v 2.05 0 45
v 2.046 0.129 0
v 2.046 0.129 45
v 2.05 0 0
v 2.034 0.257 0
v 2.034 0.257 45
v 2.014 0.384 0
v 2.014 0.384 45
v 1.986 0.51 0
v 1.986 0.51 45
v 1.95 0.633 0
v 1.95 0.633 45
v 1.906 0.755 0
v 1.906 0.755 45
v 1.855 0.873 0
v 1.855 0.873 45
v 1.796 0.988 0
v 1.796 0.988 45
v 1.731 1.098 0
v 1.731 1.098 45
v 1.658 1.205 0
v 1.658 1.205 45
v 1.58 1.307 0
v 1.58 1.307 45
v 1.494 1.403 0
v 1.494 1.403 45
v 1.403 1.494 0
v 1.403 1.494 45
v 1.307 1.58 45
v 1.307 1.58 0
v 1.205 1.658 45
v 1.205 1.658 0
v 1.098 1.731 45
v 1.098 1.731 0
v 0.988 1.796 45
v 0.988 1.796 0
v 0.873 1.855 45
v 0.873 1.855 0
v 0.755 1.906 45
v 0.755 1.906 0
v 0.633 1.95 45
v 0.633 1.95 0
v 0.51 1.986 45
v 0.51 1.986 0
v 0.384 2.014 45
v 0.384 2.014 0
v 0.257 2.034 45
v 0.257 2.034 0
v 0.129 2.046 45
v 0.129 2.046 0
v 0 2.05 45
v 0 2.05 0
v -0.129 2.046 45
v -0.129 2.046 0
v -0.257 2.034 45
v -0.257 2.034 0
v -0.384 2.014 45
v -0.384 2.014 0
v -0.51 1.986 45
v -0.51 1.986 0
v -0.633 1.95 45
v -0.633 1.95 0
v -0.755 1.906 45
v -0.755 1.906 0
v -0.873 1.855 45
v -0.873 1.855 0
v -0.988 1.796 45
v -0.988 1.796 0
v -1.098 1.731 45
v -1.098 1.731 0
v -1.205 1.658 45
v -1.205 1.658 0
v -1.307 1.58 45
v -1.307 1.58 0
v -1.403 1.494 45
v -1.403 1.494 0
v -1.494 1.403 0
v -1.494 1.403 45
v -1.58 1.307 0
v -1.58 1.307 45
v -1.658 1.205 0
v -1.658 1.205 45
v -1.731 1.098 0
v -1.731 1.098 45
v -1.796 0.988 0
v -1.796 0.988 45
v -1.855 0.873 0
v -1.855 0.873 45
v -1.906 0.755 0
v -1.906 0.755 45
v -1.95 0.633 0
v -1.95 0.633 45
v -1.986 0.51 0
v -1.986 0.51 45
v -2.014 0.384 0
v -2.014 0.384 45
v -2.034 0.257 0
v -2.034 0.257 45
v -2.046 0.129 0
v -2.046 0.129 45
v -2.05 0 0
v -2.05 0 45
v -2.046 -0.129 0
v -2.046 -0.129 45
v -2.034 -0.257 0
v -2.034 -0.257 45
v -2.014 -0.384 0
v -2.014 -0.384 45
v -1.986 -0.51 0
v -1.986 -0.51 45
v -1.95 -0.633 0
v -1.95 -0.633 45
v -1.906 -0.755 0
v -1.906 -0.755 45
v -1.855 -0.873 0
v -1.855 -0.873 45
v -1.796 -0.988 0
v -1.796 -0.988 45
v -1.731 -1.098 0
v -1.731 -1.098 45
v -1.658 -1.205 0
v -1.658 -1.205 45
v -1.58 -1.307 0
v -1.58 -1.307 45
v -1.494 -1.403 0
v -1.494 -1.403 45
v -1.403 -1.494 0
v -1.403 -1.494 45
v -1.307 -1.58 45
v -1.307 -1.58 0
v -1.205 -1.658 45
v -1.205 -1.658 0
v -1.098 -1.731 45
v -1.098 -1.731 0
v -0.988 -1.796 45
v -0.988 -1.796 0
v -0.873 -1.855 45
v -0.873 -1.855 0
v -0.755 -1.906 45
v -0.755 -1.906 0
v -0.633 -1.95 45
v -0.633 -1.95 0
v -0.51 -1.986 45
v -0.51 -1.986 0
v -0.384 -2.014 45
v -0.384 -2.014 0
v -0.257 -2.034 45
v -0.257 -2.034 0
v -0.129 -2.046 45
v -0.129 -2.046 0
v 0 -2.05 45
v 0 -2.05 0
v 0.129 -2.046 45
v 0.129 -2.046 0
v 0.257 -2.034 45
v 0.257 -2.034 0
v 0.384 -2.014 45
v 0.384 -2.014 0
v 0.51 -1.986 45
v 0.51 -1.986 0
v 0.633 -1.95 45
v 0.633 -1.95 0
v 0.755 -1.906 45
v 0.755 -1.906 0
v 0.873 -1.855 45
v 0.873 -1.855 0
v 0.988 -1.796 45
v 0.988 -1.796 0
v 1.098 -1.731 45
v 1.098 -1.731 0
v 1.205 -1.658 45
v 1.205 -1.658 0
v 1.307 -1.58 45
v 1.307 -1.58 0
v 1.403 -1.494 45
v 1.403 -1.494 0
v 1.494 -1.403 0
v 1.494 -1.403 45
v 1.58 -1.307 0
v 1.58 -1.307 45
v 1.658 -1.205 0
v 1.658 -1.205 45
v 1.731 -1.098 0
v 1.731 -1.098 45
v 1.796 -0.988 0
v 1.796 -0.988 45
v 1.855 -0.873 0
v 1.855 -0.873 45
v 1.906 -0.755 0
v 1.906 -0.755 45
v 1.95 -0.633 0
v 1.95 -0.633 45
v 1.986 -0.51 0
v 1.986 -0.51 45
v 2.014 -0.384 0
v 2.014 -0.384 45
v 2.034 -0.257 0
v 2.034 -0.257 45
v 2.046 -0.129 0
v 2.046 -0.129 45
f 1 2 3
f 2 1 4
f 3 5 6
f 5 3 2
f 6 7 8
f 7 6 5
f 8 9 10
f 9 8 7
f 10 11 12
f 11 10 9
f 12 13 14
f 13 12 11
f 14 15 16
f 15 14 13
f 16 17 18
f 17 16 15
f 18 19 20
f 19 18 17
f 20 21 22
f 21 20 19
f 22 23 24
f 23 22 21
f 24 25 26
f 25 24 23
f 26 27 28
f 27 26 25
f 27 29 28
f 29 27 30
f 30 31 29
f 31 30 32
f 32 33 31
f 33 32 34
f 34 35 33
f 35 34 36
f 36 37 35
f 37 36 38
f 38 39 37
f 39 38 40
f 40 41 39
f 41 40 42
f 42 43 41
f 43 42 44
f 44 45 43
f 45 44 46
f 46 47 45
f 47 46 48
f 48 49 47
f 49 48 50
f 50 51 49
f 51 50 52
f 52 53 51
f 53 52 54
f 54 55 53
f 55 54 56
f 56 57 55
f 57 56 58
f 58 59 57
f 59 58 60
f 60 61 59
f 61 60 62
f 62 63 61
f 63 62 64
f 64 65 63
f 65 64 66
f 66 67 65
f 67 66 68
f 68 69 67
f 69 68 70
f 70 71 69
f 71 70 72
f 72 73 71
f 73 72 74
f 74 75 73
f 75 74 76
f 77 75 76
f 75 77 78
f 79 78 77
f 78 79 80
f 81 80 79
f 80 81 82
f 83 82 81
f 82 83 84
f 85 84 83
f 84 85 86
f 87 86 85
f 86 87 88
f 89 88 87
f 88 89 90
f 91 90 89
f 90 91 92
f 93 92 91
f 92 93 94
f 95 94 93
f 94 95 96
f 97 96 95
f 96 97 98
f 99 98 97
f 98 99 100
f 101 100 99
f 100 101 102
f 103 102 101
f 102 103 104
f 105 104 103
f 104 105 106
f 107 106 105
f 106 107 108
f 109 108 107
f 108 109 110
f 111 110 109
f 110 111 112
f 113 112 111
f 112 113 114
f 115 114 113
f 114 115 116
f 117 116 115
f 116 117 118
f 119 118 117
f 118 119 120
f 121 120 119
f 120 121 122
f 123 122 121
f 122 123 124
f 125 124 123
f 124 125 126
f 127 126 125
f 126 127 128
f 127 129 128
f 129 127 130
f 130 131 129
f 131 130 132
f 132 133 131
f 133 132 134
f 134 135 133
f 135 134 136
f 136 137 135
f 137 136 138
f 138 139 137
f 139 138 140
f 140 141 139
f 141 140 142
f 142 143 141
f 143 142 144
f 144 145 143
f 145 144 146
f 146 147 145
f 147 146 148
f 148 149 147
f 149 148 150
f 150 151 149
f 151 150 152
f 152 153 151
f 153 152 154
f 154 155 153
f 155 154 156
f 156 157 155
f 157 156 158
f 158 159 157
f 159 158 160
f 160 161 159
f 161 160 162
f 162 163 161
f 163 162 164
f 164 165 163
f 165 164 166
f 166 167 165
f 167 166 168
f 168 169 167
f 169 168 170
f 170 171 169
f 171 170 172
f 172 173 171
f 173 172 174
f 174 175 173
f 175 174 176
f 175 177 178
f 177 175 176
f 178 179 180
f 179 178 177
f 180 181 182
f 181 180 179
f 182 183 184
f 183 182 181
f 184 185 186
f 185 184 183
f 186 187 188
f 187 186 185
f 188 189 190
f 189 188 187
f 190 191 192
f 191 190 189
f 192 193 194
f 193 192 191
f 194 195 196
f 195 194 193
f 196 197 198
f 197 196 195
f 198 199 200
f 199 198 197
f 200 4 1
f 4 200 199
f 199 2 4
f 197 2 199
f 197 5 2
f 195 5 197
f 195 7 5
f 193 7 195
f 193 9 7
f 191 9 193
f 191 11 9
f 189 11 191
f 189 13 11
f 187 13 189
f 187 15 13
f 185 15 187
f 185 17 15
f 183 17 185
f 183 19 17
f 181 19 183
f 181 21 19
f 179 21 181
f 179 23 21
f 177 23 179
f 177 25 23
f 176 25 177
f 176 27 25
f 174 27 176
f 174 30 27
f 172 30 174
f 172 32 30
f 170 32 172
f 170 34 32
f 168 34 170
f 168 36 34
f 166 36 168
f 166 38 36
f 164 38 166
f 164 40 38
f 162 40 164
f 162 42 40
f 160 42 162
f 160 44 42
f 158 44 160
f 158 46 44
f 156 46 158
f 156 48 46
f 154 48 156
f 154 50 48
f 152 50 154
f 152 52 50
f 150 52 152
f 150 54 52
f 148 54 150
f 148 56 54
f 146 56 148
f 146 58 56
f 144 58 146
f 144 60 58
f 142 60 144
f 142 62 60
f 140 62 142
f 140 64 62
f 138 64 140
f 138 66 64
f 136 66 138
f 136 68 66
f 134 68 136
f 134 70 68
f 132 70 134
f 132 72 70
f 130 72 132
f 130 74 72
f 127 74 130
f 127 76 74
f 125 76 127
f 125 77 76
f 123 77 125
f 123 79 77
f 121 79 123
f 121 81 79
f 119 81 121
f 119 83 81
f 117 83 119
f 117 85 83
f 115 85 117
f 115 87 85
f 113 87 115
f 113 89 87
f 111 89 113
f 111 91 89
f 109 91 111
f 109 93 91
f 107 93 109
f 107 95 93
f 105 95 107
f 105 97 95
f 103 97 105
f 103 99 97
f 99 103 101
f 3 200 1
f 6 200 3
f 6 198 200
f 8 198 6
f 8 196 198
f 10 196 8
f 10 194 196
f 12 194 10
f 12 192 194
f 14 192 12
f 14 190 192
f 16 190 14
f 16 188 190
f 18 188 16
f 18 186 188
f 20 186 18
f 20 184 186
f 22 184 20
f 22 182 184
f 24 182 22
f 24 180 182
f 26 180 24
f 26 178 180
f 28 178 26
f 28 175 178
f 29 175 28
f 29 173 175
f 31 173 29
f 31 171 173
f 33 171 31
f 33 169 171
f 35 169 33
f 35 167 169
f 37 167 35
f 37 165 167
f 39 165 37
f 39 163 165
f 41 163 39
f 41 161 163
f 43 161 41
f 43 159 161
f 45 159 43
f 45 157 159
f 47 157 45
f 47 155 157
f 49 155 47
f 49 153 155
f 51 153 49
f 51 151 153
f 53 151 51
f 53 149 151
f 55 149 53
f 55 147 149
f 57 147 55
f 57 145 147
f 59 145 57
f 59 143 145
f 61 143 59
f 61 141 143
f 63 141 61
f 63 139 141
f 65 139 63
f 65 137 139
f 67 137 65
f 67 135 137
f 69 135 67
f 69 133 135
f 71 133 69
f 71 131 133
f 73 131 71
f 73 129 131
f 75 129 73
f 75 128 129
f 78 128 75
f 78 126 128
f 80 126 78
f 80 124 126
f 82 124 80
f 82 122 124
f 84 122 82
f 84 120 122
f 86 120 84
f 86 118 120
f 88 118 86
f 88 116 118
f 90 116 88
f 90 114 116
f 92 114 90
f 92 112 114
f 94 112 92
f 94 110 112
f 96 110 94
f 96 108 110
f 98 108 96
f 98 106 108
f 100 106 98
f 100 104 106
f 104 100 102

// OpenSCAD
// Stick for HS tether rod

cylinder(d = 4.1, h = 45, $fn= 100);
